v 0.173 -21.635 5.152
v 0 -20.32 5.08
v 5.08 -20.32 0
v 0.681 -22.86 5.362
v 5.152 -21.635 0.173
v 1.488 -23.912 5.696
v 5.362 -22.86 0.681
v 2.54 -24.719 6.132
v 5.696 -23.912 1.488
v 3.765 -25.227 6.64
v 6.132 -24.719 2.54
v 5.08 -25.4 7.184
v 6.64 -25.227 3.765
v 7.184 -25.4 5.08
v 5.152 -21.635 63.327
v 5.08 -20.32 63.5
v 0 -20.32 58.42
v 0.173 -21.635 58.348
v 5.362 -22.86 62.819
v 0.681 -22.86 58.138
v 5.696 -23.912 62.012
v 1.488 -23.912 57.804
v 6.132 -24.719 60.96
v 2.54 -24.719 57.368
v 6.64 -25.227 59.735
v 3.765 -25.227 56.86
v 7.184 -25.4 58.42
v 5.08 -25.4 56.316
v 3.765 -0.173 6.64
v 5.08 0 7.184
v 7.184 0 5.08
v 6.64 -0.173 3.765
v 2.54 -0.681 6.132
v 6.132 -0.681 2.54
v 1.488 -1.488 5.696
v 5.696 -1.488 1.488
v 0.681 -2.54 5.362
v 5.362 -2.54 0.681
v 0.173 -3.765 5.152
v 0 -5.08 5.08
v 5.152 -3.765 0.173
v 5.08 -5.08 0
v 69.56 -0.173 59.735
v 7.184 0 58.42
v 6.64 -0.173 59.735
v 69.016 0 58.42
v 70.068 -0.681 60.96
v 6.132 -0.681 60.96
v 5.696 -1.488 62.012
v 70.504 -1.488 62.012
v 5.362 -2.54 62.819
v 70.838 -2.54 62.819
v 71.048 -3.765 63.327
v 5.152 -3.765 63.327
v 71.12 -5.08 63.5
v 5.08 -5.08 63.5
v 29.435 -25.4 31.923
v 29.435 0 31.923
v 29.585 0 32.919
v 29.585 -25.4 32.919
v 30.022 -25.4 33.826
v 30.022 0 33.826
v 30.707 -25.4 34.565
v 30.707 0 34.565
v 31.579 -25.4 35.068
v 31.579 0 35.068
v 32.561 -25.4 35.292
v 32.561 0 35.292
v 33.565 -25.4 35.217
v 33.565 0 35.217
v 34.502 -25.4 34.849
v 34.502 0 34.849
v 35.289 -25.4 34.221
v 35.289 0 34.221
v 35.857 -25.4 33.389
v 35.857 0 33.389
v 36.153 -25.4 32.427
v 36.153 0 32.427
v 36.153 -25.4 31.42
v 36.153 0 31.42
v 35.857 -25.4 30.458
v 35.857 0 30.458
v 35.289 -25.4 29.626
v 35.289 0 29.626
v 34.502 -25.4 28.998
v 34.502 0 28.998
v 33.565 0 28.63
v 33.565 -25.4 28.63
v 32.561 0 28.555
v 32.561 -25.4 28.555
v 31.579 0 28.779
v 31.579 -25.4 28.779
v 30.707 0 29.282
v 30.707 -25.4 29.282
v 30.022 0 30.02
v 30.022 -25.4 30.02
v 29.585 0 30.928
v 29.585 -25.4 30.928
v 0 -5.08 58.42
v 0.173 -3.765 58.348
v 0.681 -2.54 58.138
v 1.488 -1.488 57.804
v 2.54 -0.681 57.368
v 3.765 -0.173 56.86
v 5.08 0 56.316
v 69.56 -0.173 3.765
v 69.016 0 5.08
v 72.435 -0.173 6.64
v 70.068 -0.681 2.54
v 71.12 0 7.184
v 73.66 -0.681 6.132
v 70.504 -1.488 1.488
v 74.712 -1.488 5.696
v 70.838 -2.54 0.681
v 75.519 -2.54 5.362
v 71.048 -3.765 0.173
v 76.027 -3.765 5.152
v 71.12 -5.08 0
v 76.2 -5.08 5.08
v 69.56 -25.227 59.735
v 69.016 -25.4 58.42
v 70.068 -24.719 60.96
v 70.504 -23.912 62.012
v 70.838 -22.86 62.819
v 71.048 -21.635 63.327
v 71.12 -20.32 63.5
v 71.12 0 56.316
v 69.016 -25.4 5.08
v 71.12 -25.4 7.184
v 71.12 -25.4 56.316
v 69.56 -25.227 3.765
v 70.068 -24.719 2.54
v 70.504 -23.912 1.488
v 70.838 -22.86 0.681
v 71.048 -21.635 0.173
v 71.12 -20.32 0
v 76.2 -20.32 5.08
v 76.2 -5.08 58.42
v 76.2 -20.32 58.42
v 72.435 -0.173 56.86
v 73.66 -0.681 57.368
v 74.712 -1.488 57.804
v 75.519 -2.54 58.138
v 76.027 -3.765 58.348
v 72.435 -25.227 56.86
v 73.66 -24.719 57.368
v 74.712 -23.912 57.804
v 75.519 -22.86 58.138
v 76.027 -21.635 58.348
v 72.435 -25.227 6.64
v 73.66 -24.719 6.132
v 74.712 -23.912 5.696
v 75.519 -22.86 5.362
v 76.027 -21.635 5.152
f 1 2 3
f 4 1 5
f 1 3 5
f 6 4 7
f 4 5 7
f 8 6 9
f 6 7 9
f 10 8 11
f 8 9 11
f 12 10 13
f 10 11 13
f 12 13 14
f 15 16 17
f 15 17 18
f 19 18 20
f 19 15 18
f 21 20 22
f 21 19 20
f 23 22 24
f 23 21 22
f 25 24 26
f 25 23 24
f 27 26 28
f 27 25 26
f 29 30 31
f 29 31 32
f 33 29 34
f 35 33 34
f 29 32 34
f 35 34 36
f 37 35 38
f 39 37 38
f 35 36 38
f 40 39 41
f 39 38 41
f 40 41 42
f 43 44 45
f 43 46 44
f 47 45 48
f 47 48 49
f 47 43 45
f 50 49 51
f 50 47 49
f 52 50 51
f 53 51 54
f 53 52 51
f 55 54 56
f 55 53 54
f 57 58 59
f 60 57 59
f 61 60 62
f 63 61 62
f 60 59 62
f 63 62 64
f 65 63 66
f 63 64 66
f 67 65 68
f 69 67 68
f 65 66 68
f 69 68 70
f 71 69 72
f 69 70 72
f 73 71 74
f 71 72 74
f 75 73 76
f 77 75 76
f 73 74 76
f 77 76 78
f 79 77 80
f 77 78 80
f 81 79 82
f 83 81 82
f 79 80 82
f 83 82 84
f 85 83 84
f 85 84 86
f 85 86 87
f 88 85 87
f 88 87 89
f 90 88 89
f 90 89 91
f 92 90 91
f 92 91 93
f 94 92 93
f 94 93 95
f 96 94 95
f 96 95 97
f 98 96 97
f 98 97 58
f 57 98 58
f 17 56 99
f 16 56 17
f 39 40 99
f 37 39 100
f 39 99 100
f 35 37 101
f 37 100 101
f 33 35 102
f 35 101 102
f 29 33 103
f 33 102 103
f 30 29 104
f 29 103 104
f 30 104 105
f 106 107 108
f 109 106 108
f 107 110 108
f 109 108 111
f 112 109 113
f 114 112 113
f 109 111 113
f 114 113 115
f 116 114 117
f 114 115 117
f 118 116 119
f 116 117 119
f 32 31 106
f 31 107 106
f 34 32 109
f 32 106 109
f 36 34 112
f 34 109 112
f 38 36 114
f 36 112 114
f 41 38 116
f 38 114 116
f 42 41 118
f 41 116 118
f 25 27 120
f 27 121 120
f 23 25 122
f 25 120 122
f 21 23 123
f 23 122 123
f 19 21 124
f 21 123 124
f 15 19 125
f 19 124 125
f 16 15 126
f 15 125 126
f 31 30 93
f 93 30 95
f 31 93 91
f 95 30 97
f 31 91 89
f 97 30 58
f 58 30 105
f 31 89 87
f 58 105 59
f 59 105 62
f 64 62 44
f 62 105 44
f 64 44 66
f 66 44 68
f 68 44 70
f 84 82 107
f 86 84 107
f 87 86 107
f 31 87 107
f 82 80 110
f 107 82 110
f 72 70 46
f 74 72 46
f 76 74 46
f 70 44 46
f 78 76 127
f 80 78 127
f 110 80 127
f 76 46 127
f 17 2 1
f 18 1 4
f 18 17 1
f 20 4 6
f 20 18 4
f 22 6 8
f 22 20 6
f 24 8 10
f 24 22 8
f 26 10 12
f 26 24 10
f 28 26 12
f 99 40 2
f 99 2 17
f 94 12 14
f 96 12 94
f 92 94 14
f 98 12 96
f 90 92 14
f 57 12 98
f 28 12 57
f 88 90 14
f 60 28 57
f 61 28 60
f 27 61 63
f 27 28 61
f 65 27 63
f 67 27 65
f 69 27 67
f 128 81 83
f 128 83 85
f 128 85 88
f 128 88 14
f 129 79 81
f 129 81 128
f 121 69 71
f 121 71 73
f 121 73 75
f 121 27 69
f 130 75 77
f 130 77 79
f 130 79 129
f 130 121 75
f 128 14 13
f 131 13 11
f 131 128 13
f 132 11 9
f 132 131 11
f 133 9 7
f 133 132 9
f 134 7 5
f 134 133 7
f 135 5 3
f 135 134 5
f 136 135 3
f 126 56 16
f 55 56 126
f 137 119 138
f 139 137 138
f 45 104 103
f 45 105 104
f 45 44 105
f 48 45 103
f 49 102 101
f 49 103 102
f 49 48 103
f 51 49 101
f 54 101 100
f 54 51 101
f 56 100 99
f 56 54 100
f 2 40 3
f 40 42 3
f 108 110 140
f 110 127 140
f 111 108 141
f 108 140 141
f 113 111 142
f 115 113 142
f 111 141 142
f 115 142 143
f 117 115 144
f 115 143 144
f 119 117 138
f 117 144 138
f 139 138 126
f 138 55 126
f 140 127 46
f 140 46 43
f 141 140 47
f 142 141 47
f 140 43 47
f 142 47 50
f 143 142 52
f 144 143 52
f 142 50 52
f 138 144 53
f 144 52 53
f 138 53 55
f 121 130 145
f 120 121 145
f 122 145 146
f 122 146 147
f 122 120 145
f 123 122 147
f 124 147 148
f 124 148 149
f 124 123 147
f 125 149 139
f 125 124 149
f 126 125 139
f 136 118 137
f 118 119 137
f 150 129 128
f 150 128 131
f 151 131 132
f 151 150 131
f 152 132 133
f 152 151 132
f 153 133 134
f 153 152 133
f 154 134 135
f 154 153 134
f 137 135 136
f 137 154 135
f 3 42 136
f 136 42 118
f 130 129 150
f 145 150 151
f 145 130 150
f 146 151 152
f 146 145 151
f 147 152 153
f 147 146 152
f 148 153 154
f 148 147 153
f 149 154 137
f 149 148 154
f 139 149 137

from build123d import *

# Parameters (mm, degrees)
F0_W     = 76.2
F0_H     = 63.5
F1_DEPTH = 25.4
F2_SIZE  = 5.08
F3_R     = 5.08
F5_D     = 6.7564


with BuildPart() as f1:
    # F0 (on Front) → F1 (new body)
    with BuildSketch(Plane.XZ):
        with Locations((38.1, 31.75)):
            Rectangle(F0_W, F0_H)
    extrude(amount=F1_DEPTH)

    # F2
    f2_edges = [f1.edges().sort_by_distance(p)[0] for p in [
        (0, -12.7, 63.5),
        (76.2, -12.7, 63.5),
        (76.2, -12.7, 0),
        (0, -12.7, 0),
    ]]
    chamfer(f2_edges, length=F2_SIZE)

    # F3
    f3_edges = [f1.edges().sort_by_distance(p)[0] for p in [
        (0, -25.4, 31.75),
        (2.54, -25.4, 60.96),
        (38.1, -25.4, 63.5),
        (73.66, -25.4, 60.96),
        (76.2, -25.4, 31.75),
        (73.66, -25.4, 2.54),
        (38.1, -25.4, 0),
        (2.54, -25.4, 2.54),
        (38.1, 0, 0),
        (2.54, 0, 2.54),
        (0, 0, 31.75),
        (2.54, 0, 60.96),
        (38.1, 0, 63.5),
        (73.66, 0, 60.96),
        (73.66, 0, 2.54),
        (76.2, 0, 31.75),
    ]]
    fillet(f3_edges, radius=F3_R)

    # F5 (through all)
    with Locations(Plane.XZ.offset(25.4)):
        with Locations((32.8130275011, 31.9233834743)):
            Hole(F5_D / 2)


solid = f1.part
